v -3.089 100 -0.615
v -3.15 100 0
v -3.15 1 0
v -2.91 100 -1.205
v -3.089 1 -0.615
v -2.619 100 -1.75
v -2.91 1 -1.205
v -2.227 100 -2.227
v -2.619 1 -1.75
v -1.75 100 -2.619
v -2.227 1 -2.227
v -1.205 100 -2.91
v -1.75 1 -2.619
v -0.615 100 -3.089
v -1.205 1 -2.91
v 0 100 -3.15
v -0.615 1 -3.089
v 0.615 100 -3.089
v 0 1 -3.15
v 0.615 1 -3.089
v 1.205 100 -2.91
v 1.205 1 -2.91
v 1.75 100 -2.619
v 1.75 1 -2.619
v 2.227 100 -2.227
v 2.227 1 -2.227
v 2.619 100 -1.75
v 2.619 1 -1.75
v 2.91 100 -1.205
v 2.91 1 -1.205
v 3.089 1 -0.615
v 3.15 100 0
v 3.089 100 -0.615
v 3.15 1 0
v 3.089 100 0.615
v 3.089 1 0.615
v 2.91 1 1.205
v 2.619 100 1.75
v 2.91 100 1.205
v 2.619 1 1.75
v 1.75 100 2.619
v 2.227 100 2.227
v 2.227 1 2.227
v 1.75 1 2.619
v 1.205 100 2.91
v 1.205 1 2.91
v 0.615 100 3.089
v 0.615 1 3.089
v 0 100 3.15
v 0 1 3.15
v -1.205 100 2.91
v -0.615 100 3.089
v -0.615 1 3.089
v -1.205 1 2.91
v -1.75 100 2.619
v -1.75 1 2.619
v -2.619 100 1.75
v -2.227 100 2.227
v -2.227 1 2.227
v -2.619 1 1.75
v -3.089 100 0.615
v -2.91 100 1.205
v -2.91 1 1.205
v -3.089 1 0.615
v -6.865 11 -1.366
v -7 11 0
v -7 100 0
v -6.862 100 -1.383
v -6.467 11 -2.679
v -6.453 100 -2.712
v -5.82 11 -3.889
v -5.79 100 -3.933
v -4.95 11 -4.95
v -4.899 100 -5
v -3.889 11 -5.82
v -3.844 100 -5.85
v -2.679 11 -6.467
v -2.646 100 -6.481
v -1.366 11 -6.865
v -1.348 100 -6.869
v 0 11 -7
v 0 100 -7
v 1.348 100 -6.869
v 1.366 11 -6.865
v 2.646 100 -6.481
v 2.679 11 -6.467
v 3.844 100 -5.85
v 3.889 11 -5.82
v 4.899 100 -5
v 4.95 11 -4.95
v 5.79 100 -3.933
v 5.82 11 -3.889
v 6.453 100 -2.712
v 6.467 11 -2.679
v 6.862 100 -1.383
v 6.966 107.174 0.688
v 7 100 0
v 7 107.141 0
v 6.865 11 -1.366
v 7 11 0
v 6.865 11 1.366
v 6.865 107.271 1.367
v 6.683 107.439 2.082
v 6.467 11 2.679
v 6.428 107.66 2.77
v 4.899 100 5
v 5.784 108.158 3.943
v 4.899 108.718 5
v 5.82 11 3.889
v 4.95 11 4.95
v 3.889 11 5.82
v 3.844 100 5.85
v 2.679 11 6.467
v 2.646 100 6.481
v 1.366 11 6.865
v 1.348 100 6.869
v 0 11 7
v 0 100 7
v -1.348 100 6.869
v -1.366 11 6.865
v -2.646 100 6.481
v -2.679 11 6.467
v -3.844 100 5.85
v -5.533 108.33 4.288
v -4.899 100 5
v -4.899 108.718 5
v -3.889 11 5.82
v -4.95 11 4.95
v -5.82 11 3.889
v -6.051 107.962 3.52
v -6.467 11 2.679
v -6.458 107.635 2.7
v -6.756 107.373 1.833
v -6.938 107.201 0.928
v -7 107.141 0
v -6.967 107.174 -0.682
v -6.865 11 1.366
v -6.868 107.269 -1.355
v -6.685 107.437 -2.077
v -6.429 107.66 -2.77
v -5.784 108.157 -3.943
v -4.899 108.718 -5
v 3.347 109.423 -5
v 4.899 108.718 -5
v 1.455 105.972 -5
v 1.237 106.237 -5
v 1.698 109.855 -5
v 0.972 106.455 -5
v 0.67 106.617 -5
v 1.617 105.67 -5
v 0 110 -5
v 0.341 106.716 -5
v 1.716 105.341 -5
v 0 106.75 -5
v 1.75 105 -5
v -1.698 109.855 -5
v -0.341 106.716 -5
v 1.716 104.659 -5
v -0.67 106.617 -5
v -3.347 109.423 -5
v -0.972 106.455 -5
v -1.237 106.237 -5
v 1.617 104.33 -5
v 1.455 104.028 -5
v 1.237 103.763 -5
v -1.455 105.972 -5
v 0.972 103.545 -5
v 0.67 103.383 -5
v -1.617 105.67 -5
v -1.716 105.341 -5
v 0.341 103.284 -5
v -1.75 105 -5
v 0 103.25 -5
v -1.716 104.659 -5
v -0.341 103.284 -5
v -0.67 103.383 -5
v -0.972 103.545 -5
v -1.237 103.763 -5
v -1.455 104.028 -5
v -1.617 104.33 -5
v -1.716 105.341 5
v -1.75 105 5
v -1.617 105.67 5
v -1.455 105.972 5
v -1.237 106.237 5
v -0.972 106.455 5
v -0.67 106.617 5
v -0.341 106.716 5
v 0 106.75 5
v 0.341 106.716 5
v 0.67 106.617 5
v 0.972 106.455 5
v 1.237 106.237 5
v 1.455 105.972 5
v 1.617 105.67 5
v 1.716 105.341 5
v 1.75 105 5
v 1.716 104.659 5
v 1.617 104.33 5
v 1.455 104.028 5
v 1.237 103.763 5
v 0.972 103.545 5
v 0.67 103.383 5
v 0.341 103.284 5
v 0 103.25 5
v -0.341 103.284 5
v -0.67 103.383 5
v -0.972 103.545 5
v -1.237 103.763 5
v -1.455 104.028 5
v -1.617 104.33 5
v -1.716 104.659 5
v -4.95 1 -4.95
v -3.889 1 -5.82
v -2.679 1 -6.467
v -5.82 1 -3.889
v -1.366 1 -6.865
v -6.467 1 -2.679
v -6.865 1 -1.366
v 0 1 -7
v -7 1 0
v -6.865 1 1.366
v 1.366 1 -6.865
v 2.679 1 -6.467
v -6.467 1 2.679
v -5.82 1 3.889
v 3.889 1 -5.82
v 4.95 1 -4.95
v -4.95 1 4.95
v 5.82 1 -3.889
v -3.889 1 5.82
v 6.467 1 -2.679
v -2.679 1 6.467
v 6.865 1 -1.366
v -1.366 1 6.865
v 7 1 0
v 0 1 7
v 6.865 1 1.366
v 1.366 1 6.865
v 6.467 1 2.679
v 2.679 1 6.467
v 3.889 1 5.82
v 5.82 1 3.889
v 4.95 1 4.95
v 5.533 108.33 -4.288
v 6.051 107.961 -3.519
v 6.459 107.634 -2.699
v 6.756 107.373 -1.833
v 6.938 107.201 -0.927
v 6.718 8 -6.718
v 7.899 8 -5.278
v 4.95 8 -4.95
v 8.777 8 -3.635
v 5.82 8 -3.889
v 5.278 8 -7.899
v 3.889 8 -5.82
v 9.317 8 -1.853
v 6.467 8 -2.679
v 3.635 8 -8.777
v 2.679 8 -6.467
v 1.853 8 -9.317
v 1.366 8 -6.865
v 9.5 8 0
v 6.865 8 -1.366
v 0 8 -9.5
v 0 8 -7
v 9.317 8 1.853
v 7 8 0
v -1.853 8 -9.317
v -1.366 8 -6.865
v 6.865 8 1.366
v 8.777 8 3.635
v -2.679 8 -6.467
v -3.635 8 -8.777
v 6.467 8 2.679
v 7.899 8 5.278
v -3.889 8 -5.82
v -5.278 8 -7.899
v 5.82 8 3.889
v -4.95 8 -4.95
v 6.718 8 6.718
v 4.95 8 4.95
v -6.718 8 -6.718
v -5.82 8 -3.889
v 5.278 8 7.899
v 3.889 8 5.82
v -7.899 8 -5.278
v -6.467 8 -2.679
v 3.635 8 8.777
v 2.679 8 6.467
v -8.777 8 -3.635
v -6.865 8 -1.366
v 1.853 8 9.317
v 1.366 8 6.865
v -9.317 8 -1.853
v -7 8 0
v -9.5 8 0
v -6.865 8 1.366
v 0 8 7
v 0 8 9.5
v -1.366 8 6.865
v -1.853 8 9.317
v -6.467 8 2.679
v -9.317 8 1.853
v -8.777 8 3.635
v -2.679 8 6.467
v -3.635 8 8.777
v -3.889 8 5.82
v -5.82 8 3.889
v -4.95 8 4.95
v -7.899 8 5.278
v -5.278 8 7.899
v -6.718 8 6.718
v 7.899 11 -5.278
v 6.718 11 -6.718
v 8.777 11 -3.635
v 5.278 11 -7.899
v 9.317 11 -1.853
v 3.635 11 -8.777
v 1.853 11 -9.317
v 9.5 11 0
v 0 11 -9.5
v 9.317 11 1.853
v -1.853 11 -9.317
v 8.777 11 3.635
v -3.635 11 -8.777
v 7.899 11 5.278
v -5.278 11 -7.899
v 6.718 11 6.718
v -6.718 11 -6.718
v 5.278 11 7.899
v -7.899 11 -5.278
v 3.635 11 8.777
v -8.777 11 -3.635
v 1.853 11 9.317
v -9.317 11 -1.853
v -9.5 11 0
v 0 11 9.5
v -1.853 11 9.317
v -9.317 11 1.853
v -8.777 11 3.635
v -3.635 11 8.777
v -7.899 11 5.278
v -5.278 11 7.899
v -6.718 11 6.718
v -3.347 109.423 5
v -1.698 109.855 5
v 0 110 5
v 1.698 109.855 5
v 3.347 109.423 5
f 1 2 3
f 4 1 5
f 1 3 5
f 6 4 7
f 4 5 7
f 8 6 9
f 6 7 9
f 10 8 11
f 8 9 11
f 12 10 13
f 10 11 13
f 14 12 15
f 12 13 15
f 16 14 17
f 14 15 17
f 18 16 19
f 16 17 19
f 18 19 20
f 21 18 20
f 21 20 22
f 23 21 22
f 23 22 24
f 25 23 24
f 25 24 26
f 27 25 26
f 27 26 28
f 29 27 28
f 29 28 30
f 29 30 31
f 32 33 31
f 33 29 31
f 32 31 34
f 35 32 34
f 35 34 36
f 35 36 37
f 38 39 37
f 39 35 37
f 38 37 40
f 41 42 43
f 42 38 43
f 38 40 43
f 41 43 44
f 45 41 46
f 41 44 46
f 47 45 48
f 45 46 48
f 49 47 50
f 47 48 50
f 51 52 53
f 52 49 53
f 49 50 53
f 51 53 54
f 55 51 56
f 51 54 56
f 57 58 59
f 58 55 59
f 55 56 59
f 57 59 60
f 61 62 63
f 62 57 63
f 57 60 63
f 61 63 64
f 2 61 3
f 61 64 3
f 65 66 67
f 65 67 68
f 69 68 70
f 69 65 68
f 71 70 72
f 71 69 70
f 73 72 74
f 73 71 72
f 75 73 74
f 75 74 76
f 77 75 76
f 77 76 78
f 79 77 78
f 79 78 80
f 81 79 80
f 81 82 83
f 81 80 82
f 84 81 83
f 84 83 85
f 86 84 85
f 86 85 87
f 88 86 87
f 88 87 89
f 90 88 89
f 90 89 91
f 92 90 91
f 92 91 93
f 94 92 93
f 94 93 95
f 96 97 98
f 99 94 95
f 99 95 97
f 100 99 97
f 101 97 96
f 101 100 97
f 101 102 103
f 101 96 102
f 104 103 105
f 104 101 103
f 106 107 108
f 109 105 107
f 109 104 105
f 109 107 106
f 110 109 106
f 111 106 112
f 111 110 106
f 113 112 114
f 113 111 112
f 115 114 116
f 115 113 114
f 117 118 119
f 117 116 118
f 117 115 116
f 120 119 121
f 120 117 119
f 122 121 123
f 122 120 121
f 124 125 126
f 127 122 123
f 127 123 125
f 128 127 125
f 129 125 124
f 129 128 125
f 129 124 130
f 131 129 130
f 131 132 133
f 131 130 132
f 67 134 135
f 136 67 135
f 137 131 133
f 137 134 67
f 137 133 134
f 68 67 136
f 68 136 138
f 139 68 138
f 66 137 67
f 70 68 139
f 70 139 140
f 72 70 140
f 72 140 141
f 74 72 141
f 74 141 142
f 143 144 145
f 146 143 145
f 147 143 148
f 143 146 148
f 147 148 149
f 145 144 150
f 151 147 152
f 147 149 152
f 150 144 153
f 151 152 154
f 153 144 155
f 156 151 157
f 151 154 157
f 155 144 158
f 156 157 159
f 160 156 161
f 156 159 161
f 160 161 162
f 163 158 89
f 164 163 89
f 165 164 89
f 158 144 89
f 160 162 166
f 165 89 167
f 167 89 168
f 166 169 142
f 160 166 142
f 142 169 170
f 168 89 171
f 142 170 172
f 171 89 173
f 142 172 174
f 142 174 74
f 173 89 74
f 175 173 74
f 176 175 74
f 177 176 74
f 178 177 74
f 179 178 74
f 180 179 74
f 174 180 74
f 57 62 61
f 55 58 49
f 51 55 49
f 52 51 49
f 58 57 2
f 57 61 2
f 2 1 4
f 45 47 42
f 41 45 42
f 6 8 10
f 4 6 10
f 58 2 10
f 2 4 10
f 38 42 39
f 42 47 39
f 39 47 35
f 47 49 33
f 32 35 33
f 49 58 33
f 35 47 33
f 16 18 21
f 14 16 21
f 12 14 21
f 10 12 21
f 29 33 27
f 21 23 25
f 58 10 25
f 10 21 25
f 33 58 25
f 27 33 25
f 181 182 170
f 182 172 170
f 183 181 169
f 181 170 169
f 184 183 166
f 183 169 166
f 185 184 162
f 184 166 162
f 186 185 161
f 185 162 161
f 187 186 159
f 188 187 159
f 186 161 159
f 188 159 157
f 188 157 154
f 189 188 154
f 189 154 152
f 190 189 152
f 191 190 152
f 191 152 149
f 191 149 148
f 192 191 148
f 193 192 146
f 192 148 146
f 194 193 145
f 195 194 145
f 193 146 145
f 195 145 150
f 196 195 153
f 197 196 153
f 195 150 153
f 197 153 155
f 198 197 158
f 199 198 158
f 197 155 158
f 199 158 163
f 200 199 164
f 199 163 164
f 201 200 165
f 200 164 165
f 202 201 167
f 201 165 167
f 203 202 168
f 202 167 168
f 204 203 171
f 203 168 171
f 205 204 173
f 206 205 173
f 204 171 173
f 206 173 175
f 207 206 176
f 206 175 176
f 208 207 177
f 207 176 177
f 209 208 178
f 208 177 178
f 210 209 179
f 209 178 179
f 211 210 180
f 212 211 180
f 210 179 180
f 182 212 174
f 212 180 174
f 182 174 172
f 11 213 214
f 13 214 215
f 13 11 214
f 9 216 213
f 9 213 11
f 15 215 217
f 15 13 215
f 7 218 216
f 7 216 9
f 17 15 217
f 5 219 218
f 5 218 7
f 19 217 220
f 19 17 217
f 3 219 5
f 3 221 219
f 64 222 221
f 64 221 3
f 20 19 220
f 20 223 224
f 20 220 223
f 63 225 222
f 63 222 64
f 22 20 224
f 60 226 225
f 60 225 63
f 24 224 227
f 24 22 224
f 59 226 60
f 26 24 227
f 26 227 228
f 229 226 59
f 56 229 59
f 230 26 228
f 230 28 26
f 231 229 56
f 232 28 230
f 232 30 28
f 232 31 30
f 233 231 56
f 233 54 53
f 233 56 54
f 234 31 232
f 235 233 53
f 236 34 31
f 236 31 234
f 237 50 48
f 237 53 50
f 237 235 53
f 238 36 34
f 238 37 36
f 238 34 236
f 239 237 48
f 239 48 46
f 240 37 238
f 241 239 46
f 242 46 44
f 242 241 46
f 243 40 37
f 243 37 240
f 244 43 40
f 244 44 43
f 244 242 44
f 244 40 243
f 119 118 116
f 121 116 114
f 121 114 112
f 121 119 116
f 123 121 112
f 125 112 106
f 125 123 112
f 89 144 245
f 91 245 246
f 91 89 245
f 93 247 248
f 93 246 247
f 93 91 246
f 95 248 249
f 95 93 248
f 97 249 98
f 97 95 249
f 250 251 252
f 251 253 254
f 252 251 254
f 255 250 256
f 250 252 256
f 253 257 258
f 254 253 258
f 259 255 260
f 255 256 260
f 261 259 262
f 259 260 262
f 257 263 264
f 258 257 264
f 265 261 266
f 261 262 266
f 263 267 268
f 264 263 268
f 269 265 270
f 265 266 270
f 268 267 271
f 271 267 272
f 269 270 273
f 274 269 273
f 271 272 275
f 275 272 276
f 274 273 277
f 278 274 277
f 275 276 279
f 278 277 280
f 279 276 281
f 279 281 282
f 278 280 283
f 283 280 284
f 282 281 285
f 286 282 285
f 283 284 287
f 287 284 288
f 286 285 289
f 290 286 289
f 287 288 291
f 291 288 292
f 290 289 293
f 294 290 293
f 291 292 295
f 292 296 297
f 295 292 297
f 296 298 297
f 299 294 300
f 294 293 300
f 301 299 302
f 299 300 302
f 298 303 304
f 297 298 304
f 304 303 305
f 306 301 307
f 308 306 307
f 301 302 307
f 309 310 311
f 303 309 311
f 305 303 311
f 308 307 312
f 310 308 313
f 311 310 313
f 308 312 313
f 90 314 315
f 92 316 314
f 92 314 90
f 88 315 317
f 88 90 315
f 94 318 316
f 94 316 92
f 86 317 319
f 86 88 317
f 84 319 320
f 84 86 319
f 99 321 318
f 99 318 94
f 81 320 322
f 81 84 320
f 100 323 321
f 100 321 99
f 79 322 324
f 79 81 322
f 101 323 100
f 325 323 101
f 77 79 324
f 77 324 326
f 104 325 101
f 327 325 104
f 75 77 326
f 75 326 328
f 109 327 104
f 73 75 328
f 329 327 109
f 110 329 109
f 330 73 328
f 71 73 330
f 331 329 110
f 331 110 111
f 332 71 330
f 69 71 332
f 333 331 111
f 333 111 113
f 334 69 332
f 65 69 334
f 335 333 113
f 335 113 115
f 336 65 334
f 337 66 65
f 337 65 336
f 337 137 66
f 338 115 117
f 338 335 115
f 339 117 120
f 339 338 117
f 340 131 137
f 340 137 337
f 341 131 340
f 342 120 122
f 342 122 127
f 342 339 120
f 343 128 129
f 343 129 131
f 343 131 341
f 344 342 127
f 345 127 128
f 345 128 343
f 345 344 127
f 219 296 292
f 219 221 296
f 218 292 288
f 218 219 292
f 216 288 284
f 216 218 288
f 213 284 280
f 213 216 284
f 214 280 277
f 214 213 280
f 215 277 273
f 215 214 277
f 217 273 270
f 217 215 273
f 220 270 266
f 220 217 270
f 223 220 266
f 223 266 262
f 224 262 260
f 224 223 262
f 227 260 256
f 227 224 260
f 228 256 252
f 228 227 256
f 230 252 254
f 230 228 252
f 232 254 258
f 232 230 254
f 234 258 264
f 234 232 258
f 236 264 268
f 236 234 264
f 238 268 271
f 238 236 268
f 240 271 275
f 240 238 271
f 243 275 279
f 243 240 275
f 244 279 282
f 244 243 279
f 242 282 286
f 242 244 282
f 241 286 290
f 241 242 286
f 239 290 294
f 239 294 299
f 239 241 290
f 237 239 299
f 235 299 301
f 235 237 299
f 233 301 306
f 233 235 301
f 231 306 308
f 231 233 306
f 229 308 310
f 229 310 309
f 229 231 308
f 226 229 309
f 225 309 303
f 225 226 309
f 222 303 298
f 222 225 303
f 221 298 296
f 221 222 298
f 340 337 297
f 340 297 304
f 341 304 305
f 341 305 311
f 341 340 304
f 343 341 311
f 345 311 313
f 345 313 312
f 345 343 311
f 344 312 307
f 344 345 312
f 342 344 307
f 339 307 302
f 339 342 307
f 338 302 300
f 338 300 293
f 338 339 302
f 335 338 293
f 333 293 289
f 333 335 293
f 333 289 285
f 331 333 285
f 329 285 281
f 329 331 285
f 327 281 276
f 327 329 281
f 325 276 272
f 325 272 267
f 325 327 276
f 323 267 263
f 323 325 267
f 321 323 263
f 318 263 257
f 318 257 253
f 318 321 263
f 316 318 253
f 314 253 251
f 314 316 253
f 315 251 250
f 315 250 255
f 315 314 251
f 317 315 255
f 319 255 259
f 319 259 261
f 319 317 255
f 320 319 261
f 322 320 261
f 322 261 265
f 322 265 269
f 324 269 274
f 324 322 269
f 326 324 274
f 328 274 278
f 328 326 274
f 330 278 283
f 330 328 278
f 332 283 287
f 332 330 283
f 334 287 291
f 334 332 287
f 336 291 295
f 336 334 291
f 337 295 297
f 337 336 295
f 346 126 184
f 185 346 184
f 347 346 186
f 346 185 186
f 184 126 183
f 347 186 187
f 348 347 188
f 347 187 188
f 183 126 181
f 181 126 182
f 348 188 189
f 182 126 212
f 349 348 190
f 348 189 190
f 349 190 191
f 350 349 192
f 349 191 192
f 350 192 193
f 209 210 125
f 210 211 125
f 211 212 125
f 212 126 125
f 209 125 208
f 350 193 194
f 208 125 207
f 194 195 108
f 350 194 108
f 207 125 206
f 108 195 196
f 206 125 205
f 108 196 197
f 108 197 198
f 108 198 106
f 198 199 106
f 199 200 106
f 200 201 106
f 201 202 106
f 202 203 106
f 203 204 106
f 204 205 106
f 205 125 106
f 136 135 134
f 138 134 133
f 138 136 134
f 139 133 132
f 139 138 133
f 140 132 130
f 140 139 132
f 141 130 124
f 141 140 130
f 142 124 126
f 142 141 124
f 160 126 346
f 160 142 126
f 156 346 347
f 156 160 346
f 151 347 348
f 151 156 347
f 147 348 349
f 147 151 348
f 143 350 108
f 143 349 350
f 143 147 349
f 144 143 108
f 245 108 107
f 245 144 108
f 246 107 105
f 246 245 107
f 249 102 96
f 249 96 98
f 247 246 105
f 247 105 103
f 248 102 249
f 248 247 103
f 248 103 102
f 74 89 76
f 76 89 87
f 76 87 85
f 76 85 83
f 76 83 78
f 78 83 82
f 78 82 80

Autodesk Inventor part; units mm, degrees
ref_plane "YZ Plane" through (0, 0, 0) normal (1, 0, 0) x (0, 1, 0)
ref_plane "XY Plane" through (0, 0, 0) normal (0, 0, 1) x (1, 0, 0)
sketch "草圖1" plane through (0, 0, 0) normal (0, 1, 0) x (-1, 0, 0)
  circle A0 centre (0, 0) radius 3.15
  circle A1 centre (0, 0) radius 7
  dimension "d0" = 6.3
  dimension "d1" = 14
extrude "擠出1" add sketch "草圖1" along normal blind 100
sketch "草圖2" plane through (0, 100, 0) normal (0, 1, 0) x (1, 0, 0)
  line L0 (0, 0) -> (0, -5) construction
  circle A0 centre (0, 0) radius 7 projected
  line L1 (-4.899, -5) -> (4.899, -5)
  line L2 (0, 0) -> (0, 5) construction
  line L3 (4.899, 5) -> (-4.899, 5)
  point P0 (-5.3619, -4.5)
  point P1 (-5.3619, 4.5)
  point P2 (5.3619, 4.5)
  dimension "d4" = 5
  dimension "d38" = 5
ref_plane "工作平面1" through (0, 50, 0) normal (0, 1, 0) x (-1, 0, 0)
ref_plane "工作平面2" through (0, 11, 0) normal (0, 1, 0) x (-1, 0, 0)
sketch "草圖10" plane through (0, 11, 0) normal (0, 1, 0) x (-1, 0, 0)
  circle A0 centre (0, 0) radius 3.15
  circle A1 centre (0, 0) radius 9.5
  dimension "d30" = 6.3
  dimension "d31" = 19
extrude "擠出9" add sketch "草圖10" against normal blind 3
extrude "擠出11" add sketch "草圖2" along normal blind 10 contours A0 L1 L3
sketch "草圖12" plane through (4.899, 100, -5) normal (0, 0, -1) x (-1, 0, 0)
  circle A0 centre (4.899, 5) radius 1.75
  line L0 (9.798, 0) -> (0, 0) projected
  arc A1 (11.899, 7.1414) -> (-2.101, 7.1414) centre (4.899, 0) ccw
  line L1 (-2.101, -89) -> (-2.101, 10) projected
  line L2 (-2.101, 7.1414) -> (-2.101, 0)
  line L3 (-2.101, -89) -> (-2.101, 10) projected
  line L4 (11.899, -89) -> (11.899, 10) projected
  line L5 (11.899, 0) -> (-2.101, 0)
  line L6 (11.899, -89) -> (11.899, 10) projected
  line L7 (11.899, 0) -> (11.899, 7.1414)
  line L8 (11.899, -89) -> (11.899, 10) projected
  line L9 (-2.101, 7.1414) -> (-2.101, 10)
  line L10 (0, 10) -> (-2.101, 10) projected
  line L11 (11.899, 10) -> (-2.101, 10)
  line L12 (11.899, 7.1414) -> (11.899, 10)
  point P0 (4.899, -100)
  dimension "d41" = 3.5
  dimension "d44" = 20
extrude "擠出12" cut sketch "草圖12" against normal up to next contours A0
extrude "擠出13" cut sketch "草圖12" against normal up to next contours A1 L11 L4 | L1 L10 L11 A1
sketch "Sketch13" plane through (0, 0, 0) normal (0, -1, 0) x (1, 0, 0)
  circle A0 centre (0, 0) radius 7 projected
  circle A1 centre (0, 0) radius 7
extrude "Extrusion14" cut sketch "Sketch13" against normal blind 1
properties part number "筷子套"
